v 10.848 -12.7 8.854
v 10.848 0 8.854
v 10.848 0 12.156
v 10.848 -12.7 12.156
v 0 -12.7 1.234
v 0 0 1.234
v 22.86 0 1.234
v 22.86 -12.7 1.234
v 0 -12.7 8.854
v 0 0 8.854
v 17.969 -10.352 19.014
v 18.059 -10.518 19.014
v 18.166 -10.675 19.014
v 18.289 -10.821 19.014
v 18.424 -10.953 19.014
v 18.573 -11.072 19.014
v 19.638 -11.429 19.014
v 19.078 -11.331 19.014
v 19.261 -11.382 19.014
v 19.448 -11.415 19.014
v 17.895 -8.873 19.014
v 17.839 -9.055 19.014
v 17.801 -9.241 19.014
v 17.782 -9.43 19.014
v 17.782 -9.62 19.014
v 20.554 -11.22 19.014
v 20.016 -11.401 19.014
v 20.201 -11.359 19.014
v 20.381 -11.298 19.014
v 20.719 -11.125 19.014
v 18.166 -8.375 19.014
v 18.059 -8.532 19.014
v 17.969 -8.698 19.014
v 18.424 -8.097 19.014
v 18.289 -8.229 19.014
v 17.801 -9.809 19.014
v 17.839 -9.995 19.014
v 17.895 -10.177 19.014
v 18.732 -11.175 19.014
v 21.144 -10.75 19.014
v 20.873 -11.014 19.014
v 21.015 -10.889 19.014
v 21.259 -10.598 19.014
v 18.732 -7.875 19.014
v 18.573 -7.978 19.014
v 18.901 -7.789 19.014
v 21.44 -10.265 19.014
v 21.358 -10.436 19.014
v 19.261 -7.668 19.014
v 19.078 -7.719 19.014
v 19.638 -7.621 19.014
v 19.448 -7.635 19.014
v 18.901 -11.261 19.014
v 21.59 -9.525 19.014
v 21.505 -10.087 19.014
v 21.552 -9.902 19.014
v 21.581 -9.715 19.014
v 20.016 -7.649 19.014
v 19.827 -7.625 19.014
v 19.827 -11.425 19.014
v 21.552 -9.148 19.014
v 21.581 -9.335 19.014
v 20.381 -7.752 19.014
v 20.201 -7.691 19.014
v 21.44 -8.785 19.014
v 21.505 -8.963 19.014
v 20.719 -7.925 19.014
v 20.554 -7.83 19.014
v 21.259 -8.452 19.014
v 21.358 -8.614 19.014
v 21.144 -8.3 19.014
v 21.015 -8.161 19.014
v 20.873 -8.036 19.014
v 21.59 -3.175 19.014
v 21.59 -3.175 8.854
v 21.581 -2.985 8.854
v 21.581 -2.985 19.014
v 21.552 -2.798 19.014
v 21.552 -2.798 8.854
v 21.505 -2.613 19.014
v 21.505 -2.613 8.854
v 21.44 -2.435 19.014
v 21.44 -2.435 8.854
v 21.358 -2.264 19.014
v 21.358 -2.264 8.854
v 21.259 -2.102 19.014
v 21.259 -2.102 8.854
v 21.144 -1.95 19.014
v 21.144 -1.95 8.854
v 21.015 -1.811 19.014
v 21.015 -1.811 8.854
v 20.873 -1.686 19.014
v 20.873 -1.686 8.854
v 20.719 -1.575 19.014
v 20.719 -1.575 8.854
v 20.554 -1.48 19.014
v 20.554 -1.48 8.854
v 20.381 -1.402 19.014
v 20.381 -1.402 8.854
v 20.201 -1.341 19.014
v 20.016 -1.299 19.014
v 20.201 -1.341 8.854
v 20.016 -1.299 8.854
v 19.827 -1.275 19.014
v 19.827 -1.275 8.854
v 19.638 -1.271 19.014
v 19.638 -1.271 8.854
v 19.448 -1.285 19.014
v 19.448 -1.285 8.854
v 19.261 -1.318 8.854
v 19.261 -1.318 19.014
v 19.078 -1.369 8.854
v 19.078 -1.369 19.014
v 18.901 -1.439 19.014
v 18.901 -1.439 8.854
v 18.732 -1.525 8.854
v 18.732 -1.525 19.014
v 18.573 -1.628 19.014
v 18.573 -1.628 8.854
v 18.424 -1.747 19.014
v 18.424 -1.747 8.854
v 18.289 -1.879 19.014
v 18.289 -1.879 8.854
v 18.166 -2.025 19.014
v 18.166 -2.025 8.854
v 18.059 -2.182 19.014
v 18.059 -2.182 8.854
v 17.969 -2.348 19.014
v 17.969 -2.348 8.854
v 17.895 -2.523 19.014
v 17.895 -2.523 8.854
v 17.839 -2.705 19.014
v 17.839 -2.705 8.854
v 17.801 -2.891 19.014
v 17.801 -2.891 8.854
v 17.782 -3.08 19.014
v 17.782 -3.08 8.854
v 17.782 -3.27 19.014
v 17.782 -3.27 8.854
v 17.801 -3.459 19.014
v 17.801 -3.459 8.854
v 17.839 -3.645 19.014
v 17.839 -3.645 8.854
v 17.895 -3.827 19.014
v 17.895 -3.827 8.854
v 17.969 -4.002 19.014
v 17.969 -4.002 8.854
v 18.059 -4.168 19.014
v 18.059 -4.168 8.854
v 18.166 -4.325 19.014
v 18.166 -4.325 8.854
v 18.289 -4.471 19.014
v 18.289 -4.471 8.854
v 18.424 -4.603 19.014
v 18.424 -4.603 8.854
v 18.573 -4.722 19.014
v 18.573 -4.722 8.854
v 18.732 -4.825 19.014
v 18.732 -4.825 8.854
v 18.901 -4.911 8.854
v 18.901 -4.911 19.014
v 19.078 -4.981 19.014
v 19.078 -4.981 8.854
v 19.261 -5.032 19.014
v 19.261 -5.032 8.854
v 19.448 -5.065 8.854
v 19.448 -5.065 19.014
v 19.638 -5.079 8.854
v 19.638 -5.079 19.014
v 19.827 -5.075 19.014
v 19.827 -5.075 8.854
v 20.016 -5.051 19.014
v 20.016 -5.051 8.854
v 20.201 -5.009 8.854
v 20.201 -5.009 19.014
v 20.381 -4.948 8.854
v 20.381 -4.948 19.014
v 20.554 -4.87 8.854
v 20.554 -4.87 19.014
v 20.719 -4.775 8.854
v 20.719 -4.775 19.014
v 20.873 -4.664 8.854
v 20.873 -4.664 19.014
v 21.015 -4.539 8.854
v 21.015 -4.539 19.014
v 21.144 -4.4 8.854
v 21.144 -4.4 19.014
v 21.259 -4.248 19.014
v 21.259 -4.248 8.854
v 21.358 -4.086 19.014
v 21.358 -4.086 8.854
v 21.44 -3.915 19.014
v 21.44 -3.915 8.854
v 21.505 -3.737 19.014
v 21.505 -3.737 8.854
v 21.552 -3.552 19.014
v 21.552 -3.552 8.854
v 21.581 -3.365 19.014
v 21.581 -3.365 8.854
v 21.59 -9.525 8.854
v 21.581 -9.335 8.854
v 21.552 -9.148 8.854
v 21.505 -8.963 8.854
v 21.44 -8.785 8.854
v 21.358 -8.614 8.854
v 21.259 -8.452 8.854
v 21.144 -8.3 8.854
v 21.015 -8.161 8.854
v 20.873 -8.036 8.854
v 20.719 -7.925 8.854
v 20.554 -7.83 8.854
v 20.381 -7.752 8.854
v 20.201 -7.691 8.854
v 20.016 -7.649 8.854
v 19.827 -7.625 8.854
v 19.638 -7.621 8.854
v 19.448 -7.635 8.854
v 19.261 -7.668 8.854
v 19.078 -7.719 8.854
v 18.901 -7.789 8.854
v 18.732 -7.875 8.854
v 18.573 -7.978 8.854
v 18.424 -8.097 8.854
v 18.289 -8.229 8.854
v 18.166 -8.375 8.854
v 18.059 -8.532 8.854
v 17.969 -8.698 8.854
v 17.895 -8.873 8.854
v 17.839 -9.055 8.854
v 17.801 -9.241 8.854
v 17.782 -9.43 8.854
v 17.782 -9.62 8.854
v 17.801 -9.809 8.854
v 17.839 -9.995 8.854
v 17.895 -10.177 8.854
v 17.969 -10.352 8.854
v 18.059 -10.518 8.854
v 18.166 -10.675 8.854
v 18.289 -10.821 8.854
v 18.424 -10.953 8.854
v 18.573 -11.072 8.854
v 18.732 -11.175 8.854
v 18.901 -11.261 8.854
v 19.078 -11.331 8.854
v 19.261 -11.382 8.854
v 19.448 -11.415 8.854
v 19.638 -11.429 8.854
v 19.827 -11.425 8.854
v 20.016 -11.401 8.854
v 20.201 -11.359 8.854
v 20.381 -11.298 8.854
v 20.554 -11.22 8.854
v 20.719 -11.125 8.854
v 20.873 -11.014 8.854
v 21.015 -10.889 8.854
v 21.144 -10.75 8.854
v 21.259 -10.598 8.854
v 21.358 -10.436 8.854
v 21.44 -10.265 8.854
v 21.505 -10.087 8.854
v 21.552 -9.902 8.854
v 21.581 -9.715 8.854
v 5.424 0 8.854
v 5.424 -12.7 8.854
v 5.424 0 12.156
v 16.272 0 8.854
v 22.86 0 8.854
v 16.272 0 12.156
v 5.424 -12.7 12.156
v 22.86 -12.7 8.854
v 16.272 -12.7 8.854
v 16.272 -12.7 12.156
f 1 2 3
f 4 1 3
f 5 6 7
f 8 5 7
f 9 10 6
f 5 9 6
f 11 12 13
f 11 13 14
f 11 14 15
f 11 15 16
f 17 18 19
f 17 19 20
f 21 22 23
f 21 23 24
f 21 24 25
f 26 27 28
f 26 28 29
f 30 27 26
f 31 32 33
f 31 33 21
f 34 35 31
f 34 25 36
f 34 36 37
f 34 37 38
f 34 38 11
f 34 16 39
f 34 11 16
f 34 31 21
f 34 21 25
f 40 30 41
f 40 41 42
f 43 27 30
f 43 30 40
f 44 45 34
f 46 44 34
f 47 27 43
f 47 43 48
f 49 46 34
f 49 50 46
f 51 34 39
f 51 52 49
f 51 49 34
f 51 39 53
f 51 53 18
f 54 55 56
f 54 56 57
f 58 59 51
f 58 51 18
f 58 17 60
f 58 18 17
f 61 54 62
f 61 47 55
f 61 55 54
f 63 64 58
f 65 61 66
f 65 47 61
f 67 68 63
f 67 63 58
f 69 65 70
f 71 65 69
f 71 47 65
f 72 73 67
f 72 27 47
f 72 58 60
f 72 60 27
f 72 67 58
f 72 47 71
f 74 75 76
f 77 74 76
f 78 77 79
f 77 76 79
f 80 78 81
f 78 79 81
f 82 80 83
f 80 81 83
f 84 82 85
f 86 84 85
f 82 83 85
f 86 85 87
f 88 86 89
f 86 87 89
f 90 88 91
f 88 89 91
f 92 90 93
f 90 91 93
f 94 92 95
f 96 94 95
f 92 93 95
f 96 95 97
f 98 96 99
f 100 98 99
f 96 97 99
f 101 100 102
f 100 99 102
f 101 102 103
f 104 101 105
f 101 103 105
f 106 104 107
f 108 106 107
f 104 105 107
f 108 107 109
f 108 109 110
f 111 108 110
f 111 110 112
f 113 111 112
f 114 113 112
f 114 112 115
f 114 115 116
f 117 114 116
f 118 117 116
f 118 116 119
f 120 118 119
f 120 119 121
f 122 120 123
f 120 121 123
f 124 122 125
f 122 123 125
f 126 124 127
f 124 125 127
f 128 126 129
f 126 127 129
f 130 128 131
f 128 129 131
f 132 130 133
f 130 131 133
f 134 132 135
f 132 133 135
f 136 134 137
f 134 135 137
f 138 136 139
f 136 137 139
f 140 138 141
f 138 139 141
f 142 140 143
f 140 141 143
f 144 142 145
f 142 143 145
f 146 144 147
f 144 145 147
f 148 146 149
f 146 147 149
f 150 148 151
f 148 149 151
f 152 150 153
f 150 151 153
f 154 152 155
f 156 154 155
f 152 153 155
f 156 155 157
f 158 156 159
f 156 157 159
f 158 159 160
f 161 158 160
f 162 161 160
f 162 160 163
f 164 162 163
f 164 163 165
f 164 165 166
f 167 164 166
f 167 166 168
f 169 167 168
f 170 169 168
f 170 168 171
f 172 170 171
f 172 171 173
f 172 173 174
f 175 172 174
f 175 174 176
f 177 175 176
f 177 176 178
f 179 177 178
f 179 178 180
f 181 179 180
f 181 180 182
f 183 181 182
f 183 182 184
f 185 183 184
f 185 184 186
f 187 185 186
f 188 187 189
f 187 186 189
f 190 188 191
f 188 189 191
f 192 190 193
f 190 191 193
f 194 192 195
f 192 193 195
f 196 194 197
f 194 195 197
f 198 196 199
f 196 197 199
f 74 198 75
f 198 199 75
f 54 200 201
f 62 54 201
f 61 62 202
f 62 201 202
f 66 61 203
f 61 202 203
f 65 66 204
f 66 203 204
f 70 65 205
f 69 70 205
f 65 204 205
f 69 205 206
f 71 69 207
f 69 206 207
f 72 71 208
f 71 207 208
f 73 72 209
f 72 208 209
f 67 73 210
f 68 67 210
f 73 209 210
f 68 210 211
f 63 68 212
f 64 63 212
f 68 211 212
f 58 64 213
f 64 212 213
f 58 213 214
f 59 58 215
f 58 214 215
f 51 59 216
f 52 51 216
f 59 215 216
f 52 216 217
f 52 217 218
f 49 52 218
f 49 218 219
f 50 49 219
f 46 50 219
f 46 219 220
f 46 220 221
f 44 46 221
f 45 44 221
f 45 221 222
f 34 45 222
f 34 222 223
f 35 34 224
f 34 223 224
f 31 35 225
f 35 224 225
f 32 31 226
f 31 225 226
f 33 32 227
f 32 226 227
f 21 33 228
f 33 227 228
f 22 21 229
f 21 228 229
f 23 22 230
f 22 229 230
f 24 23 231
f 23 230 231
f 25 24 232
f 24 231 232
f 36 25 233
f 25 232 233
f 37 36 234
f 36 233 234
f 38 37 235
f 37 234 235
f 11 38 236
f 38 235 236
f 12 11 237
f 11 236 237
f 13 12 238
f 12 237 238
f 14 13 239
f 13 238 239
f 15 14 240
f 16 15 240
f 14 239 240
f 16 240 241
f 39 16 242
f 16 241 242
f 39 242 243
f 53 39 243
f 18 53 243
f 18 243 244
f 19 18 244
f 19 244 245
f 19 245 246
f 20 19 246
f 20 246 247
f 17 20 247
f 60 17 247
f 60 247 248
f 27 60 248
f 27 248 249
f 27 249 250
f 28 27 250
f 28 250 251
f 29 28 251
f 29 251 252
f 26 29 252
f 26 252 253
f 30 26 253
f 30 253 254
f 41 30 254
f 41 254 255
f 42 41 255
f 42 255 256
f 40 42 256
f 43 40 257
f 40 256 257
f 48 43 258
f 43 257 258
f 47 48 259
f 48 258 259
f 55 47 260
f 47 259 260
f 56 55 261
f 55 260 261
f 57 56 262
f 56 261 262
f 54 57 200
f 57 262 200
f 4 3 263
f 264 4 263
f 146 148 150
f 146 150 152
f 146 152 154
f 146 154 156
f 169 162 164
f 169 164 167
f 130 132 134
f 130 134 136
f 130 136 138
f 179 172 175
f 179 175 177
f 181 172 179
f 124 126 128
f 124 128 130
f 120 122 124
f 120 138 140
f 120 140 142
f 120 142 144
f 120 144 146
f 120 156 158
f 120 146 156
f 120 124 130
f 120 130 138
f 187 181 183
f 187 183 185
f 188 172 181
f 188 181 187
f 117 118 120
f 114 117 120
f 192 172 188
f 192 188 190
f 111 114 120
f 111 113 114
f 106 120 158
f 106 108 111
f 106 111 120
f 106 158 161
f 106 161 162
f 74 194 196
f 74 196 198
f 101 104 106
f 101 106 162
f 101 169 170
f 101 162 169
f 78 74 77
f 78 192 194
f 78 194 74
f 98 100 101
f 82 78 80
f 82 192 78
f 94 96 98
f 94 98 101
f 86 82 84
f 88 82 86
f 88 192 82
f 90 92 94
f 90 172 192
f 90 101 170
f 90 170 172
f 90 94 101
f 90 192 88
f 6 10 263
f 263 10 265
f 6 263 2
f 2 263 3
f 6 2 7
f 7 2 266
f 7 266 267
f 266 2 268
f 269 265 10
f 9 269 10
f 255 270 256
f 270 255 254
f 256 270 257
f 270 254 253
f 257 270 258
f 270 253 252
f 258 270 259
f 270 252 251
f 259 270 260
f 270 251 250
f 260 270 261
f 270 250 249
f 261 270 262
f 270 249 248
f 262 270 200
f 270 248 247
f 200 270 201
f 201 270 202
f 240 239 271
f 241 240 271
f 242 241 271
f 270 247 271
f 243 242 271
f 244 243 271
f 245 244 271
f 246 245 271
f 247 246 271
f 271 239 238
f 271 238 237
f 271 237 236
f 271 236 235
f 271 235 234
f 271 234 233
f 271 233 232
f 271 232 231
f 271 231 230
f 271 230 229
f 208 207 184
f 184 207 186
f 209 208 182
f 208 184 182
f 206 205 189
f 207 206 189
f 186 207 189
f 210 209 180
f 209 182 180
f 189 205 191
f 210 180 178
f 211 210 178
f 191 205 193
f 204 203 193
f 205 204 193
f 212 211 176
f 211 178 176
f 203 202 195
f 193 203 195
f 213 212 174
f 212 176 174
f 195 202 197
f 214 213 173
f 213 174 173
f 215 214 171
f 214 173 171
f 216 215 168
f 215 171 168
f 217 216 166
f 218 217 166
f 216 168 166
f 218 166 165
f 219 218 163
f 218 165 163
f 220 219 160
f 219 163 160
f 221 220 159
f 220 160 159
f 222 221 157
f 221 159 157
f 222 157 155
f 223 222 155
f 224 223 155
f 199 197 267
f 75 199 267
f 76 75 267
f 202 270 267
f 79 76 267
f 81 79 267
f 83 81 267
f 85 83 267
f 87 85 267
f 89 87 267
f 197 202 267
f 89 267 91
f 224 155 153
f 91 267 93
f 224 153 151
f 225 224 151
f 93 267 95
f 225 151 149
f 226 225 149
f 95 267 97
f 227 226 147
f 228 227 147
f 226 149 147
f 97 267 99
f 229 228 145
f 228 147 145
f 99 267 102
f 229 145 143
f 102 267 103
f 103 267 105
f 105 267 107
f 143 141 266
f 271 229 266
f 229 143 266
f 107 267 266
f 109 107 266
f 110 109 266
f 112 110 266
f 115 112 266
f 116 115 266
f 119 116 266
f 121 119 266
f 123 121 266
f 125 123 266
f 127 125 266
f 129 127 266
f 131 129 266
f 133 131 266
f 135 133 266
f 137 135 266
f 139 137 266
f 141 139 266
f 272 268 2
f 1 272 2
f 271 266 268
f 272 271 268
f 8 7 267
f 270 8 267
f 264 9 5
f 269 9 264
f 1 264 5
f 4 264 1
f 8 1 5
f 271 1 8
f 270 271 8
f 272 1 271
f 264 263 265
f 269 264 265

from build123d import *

# Parameters (mm, degrees)
F1_DEPTH = 12.7
F2_R     = 1.905
F3_DEPTH = 10.16


with BuildPart() as f1:
    # F0 (on Front) → F1 (new body)
    with BuildSketch(Plane.XZ):
        Polygon((0, 8.854078), (0, 1.234078), (22.86, 1.234078), (22.86, 8.854078), (16.271867, 8.854078), (10.847912, 8.854078), (5.423956, 8.854078), align=None)
        Polygon((5.423956, 12.156078), (0, 8.854078), (5.423956, 8.854078), align=None)
        Polygon((10.847912, 12.156078), (5.423956, 8.854078), (10.847912, 8.854078), align=None)
        Polygon((10.847912, 8.854078), (16.271867, 8.854078), (16.271867, 12.156078), align=None)
    extrude(amount=F1_DEPTH)

    # F2 (on face) → F3 (join)
    with BuildSketch(Plane.XY.offset(8.854078)):
        with Locations((19.685, -3.175)):
            Circle(F2_R)
        with Locations((19.685, -9.525)):
            Circle(F2_R)
    extrude(amount=F3_DEPTH)


solid = f1.part
